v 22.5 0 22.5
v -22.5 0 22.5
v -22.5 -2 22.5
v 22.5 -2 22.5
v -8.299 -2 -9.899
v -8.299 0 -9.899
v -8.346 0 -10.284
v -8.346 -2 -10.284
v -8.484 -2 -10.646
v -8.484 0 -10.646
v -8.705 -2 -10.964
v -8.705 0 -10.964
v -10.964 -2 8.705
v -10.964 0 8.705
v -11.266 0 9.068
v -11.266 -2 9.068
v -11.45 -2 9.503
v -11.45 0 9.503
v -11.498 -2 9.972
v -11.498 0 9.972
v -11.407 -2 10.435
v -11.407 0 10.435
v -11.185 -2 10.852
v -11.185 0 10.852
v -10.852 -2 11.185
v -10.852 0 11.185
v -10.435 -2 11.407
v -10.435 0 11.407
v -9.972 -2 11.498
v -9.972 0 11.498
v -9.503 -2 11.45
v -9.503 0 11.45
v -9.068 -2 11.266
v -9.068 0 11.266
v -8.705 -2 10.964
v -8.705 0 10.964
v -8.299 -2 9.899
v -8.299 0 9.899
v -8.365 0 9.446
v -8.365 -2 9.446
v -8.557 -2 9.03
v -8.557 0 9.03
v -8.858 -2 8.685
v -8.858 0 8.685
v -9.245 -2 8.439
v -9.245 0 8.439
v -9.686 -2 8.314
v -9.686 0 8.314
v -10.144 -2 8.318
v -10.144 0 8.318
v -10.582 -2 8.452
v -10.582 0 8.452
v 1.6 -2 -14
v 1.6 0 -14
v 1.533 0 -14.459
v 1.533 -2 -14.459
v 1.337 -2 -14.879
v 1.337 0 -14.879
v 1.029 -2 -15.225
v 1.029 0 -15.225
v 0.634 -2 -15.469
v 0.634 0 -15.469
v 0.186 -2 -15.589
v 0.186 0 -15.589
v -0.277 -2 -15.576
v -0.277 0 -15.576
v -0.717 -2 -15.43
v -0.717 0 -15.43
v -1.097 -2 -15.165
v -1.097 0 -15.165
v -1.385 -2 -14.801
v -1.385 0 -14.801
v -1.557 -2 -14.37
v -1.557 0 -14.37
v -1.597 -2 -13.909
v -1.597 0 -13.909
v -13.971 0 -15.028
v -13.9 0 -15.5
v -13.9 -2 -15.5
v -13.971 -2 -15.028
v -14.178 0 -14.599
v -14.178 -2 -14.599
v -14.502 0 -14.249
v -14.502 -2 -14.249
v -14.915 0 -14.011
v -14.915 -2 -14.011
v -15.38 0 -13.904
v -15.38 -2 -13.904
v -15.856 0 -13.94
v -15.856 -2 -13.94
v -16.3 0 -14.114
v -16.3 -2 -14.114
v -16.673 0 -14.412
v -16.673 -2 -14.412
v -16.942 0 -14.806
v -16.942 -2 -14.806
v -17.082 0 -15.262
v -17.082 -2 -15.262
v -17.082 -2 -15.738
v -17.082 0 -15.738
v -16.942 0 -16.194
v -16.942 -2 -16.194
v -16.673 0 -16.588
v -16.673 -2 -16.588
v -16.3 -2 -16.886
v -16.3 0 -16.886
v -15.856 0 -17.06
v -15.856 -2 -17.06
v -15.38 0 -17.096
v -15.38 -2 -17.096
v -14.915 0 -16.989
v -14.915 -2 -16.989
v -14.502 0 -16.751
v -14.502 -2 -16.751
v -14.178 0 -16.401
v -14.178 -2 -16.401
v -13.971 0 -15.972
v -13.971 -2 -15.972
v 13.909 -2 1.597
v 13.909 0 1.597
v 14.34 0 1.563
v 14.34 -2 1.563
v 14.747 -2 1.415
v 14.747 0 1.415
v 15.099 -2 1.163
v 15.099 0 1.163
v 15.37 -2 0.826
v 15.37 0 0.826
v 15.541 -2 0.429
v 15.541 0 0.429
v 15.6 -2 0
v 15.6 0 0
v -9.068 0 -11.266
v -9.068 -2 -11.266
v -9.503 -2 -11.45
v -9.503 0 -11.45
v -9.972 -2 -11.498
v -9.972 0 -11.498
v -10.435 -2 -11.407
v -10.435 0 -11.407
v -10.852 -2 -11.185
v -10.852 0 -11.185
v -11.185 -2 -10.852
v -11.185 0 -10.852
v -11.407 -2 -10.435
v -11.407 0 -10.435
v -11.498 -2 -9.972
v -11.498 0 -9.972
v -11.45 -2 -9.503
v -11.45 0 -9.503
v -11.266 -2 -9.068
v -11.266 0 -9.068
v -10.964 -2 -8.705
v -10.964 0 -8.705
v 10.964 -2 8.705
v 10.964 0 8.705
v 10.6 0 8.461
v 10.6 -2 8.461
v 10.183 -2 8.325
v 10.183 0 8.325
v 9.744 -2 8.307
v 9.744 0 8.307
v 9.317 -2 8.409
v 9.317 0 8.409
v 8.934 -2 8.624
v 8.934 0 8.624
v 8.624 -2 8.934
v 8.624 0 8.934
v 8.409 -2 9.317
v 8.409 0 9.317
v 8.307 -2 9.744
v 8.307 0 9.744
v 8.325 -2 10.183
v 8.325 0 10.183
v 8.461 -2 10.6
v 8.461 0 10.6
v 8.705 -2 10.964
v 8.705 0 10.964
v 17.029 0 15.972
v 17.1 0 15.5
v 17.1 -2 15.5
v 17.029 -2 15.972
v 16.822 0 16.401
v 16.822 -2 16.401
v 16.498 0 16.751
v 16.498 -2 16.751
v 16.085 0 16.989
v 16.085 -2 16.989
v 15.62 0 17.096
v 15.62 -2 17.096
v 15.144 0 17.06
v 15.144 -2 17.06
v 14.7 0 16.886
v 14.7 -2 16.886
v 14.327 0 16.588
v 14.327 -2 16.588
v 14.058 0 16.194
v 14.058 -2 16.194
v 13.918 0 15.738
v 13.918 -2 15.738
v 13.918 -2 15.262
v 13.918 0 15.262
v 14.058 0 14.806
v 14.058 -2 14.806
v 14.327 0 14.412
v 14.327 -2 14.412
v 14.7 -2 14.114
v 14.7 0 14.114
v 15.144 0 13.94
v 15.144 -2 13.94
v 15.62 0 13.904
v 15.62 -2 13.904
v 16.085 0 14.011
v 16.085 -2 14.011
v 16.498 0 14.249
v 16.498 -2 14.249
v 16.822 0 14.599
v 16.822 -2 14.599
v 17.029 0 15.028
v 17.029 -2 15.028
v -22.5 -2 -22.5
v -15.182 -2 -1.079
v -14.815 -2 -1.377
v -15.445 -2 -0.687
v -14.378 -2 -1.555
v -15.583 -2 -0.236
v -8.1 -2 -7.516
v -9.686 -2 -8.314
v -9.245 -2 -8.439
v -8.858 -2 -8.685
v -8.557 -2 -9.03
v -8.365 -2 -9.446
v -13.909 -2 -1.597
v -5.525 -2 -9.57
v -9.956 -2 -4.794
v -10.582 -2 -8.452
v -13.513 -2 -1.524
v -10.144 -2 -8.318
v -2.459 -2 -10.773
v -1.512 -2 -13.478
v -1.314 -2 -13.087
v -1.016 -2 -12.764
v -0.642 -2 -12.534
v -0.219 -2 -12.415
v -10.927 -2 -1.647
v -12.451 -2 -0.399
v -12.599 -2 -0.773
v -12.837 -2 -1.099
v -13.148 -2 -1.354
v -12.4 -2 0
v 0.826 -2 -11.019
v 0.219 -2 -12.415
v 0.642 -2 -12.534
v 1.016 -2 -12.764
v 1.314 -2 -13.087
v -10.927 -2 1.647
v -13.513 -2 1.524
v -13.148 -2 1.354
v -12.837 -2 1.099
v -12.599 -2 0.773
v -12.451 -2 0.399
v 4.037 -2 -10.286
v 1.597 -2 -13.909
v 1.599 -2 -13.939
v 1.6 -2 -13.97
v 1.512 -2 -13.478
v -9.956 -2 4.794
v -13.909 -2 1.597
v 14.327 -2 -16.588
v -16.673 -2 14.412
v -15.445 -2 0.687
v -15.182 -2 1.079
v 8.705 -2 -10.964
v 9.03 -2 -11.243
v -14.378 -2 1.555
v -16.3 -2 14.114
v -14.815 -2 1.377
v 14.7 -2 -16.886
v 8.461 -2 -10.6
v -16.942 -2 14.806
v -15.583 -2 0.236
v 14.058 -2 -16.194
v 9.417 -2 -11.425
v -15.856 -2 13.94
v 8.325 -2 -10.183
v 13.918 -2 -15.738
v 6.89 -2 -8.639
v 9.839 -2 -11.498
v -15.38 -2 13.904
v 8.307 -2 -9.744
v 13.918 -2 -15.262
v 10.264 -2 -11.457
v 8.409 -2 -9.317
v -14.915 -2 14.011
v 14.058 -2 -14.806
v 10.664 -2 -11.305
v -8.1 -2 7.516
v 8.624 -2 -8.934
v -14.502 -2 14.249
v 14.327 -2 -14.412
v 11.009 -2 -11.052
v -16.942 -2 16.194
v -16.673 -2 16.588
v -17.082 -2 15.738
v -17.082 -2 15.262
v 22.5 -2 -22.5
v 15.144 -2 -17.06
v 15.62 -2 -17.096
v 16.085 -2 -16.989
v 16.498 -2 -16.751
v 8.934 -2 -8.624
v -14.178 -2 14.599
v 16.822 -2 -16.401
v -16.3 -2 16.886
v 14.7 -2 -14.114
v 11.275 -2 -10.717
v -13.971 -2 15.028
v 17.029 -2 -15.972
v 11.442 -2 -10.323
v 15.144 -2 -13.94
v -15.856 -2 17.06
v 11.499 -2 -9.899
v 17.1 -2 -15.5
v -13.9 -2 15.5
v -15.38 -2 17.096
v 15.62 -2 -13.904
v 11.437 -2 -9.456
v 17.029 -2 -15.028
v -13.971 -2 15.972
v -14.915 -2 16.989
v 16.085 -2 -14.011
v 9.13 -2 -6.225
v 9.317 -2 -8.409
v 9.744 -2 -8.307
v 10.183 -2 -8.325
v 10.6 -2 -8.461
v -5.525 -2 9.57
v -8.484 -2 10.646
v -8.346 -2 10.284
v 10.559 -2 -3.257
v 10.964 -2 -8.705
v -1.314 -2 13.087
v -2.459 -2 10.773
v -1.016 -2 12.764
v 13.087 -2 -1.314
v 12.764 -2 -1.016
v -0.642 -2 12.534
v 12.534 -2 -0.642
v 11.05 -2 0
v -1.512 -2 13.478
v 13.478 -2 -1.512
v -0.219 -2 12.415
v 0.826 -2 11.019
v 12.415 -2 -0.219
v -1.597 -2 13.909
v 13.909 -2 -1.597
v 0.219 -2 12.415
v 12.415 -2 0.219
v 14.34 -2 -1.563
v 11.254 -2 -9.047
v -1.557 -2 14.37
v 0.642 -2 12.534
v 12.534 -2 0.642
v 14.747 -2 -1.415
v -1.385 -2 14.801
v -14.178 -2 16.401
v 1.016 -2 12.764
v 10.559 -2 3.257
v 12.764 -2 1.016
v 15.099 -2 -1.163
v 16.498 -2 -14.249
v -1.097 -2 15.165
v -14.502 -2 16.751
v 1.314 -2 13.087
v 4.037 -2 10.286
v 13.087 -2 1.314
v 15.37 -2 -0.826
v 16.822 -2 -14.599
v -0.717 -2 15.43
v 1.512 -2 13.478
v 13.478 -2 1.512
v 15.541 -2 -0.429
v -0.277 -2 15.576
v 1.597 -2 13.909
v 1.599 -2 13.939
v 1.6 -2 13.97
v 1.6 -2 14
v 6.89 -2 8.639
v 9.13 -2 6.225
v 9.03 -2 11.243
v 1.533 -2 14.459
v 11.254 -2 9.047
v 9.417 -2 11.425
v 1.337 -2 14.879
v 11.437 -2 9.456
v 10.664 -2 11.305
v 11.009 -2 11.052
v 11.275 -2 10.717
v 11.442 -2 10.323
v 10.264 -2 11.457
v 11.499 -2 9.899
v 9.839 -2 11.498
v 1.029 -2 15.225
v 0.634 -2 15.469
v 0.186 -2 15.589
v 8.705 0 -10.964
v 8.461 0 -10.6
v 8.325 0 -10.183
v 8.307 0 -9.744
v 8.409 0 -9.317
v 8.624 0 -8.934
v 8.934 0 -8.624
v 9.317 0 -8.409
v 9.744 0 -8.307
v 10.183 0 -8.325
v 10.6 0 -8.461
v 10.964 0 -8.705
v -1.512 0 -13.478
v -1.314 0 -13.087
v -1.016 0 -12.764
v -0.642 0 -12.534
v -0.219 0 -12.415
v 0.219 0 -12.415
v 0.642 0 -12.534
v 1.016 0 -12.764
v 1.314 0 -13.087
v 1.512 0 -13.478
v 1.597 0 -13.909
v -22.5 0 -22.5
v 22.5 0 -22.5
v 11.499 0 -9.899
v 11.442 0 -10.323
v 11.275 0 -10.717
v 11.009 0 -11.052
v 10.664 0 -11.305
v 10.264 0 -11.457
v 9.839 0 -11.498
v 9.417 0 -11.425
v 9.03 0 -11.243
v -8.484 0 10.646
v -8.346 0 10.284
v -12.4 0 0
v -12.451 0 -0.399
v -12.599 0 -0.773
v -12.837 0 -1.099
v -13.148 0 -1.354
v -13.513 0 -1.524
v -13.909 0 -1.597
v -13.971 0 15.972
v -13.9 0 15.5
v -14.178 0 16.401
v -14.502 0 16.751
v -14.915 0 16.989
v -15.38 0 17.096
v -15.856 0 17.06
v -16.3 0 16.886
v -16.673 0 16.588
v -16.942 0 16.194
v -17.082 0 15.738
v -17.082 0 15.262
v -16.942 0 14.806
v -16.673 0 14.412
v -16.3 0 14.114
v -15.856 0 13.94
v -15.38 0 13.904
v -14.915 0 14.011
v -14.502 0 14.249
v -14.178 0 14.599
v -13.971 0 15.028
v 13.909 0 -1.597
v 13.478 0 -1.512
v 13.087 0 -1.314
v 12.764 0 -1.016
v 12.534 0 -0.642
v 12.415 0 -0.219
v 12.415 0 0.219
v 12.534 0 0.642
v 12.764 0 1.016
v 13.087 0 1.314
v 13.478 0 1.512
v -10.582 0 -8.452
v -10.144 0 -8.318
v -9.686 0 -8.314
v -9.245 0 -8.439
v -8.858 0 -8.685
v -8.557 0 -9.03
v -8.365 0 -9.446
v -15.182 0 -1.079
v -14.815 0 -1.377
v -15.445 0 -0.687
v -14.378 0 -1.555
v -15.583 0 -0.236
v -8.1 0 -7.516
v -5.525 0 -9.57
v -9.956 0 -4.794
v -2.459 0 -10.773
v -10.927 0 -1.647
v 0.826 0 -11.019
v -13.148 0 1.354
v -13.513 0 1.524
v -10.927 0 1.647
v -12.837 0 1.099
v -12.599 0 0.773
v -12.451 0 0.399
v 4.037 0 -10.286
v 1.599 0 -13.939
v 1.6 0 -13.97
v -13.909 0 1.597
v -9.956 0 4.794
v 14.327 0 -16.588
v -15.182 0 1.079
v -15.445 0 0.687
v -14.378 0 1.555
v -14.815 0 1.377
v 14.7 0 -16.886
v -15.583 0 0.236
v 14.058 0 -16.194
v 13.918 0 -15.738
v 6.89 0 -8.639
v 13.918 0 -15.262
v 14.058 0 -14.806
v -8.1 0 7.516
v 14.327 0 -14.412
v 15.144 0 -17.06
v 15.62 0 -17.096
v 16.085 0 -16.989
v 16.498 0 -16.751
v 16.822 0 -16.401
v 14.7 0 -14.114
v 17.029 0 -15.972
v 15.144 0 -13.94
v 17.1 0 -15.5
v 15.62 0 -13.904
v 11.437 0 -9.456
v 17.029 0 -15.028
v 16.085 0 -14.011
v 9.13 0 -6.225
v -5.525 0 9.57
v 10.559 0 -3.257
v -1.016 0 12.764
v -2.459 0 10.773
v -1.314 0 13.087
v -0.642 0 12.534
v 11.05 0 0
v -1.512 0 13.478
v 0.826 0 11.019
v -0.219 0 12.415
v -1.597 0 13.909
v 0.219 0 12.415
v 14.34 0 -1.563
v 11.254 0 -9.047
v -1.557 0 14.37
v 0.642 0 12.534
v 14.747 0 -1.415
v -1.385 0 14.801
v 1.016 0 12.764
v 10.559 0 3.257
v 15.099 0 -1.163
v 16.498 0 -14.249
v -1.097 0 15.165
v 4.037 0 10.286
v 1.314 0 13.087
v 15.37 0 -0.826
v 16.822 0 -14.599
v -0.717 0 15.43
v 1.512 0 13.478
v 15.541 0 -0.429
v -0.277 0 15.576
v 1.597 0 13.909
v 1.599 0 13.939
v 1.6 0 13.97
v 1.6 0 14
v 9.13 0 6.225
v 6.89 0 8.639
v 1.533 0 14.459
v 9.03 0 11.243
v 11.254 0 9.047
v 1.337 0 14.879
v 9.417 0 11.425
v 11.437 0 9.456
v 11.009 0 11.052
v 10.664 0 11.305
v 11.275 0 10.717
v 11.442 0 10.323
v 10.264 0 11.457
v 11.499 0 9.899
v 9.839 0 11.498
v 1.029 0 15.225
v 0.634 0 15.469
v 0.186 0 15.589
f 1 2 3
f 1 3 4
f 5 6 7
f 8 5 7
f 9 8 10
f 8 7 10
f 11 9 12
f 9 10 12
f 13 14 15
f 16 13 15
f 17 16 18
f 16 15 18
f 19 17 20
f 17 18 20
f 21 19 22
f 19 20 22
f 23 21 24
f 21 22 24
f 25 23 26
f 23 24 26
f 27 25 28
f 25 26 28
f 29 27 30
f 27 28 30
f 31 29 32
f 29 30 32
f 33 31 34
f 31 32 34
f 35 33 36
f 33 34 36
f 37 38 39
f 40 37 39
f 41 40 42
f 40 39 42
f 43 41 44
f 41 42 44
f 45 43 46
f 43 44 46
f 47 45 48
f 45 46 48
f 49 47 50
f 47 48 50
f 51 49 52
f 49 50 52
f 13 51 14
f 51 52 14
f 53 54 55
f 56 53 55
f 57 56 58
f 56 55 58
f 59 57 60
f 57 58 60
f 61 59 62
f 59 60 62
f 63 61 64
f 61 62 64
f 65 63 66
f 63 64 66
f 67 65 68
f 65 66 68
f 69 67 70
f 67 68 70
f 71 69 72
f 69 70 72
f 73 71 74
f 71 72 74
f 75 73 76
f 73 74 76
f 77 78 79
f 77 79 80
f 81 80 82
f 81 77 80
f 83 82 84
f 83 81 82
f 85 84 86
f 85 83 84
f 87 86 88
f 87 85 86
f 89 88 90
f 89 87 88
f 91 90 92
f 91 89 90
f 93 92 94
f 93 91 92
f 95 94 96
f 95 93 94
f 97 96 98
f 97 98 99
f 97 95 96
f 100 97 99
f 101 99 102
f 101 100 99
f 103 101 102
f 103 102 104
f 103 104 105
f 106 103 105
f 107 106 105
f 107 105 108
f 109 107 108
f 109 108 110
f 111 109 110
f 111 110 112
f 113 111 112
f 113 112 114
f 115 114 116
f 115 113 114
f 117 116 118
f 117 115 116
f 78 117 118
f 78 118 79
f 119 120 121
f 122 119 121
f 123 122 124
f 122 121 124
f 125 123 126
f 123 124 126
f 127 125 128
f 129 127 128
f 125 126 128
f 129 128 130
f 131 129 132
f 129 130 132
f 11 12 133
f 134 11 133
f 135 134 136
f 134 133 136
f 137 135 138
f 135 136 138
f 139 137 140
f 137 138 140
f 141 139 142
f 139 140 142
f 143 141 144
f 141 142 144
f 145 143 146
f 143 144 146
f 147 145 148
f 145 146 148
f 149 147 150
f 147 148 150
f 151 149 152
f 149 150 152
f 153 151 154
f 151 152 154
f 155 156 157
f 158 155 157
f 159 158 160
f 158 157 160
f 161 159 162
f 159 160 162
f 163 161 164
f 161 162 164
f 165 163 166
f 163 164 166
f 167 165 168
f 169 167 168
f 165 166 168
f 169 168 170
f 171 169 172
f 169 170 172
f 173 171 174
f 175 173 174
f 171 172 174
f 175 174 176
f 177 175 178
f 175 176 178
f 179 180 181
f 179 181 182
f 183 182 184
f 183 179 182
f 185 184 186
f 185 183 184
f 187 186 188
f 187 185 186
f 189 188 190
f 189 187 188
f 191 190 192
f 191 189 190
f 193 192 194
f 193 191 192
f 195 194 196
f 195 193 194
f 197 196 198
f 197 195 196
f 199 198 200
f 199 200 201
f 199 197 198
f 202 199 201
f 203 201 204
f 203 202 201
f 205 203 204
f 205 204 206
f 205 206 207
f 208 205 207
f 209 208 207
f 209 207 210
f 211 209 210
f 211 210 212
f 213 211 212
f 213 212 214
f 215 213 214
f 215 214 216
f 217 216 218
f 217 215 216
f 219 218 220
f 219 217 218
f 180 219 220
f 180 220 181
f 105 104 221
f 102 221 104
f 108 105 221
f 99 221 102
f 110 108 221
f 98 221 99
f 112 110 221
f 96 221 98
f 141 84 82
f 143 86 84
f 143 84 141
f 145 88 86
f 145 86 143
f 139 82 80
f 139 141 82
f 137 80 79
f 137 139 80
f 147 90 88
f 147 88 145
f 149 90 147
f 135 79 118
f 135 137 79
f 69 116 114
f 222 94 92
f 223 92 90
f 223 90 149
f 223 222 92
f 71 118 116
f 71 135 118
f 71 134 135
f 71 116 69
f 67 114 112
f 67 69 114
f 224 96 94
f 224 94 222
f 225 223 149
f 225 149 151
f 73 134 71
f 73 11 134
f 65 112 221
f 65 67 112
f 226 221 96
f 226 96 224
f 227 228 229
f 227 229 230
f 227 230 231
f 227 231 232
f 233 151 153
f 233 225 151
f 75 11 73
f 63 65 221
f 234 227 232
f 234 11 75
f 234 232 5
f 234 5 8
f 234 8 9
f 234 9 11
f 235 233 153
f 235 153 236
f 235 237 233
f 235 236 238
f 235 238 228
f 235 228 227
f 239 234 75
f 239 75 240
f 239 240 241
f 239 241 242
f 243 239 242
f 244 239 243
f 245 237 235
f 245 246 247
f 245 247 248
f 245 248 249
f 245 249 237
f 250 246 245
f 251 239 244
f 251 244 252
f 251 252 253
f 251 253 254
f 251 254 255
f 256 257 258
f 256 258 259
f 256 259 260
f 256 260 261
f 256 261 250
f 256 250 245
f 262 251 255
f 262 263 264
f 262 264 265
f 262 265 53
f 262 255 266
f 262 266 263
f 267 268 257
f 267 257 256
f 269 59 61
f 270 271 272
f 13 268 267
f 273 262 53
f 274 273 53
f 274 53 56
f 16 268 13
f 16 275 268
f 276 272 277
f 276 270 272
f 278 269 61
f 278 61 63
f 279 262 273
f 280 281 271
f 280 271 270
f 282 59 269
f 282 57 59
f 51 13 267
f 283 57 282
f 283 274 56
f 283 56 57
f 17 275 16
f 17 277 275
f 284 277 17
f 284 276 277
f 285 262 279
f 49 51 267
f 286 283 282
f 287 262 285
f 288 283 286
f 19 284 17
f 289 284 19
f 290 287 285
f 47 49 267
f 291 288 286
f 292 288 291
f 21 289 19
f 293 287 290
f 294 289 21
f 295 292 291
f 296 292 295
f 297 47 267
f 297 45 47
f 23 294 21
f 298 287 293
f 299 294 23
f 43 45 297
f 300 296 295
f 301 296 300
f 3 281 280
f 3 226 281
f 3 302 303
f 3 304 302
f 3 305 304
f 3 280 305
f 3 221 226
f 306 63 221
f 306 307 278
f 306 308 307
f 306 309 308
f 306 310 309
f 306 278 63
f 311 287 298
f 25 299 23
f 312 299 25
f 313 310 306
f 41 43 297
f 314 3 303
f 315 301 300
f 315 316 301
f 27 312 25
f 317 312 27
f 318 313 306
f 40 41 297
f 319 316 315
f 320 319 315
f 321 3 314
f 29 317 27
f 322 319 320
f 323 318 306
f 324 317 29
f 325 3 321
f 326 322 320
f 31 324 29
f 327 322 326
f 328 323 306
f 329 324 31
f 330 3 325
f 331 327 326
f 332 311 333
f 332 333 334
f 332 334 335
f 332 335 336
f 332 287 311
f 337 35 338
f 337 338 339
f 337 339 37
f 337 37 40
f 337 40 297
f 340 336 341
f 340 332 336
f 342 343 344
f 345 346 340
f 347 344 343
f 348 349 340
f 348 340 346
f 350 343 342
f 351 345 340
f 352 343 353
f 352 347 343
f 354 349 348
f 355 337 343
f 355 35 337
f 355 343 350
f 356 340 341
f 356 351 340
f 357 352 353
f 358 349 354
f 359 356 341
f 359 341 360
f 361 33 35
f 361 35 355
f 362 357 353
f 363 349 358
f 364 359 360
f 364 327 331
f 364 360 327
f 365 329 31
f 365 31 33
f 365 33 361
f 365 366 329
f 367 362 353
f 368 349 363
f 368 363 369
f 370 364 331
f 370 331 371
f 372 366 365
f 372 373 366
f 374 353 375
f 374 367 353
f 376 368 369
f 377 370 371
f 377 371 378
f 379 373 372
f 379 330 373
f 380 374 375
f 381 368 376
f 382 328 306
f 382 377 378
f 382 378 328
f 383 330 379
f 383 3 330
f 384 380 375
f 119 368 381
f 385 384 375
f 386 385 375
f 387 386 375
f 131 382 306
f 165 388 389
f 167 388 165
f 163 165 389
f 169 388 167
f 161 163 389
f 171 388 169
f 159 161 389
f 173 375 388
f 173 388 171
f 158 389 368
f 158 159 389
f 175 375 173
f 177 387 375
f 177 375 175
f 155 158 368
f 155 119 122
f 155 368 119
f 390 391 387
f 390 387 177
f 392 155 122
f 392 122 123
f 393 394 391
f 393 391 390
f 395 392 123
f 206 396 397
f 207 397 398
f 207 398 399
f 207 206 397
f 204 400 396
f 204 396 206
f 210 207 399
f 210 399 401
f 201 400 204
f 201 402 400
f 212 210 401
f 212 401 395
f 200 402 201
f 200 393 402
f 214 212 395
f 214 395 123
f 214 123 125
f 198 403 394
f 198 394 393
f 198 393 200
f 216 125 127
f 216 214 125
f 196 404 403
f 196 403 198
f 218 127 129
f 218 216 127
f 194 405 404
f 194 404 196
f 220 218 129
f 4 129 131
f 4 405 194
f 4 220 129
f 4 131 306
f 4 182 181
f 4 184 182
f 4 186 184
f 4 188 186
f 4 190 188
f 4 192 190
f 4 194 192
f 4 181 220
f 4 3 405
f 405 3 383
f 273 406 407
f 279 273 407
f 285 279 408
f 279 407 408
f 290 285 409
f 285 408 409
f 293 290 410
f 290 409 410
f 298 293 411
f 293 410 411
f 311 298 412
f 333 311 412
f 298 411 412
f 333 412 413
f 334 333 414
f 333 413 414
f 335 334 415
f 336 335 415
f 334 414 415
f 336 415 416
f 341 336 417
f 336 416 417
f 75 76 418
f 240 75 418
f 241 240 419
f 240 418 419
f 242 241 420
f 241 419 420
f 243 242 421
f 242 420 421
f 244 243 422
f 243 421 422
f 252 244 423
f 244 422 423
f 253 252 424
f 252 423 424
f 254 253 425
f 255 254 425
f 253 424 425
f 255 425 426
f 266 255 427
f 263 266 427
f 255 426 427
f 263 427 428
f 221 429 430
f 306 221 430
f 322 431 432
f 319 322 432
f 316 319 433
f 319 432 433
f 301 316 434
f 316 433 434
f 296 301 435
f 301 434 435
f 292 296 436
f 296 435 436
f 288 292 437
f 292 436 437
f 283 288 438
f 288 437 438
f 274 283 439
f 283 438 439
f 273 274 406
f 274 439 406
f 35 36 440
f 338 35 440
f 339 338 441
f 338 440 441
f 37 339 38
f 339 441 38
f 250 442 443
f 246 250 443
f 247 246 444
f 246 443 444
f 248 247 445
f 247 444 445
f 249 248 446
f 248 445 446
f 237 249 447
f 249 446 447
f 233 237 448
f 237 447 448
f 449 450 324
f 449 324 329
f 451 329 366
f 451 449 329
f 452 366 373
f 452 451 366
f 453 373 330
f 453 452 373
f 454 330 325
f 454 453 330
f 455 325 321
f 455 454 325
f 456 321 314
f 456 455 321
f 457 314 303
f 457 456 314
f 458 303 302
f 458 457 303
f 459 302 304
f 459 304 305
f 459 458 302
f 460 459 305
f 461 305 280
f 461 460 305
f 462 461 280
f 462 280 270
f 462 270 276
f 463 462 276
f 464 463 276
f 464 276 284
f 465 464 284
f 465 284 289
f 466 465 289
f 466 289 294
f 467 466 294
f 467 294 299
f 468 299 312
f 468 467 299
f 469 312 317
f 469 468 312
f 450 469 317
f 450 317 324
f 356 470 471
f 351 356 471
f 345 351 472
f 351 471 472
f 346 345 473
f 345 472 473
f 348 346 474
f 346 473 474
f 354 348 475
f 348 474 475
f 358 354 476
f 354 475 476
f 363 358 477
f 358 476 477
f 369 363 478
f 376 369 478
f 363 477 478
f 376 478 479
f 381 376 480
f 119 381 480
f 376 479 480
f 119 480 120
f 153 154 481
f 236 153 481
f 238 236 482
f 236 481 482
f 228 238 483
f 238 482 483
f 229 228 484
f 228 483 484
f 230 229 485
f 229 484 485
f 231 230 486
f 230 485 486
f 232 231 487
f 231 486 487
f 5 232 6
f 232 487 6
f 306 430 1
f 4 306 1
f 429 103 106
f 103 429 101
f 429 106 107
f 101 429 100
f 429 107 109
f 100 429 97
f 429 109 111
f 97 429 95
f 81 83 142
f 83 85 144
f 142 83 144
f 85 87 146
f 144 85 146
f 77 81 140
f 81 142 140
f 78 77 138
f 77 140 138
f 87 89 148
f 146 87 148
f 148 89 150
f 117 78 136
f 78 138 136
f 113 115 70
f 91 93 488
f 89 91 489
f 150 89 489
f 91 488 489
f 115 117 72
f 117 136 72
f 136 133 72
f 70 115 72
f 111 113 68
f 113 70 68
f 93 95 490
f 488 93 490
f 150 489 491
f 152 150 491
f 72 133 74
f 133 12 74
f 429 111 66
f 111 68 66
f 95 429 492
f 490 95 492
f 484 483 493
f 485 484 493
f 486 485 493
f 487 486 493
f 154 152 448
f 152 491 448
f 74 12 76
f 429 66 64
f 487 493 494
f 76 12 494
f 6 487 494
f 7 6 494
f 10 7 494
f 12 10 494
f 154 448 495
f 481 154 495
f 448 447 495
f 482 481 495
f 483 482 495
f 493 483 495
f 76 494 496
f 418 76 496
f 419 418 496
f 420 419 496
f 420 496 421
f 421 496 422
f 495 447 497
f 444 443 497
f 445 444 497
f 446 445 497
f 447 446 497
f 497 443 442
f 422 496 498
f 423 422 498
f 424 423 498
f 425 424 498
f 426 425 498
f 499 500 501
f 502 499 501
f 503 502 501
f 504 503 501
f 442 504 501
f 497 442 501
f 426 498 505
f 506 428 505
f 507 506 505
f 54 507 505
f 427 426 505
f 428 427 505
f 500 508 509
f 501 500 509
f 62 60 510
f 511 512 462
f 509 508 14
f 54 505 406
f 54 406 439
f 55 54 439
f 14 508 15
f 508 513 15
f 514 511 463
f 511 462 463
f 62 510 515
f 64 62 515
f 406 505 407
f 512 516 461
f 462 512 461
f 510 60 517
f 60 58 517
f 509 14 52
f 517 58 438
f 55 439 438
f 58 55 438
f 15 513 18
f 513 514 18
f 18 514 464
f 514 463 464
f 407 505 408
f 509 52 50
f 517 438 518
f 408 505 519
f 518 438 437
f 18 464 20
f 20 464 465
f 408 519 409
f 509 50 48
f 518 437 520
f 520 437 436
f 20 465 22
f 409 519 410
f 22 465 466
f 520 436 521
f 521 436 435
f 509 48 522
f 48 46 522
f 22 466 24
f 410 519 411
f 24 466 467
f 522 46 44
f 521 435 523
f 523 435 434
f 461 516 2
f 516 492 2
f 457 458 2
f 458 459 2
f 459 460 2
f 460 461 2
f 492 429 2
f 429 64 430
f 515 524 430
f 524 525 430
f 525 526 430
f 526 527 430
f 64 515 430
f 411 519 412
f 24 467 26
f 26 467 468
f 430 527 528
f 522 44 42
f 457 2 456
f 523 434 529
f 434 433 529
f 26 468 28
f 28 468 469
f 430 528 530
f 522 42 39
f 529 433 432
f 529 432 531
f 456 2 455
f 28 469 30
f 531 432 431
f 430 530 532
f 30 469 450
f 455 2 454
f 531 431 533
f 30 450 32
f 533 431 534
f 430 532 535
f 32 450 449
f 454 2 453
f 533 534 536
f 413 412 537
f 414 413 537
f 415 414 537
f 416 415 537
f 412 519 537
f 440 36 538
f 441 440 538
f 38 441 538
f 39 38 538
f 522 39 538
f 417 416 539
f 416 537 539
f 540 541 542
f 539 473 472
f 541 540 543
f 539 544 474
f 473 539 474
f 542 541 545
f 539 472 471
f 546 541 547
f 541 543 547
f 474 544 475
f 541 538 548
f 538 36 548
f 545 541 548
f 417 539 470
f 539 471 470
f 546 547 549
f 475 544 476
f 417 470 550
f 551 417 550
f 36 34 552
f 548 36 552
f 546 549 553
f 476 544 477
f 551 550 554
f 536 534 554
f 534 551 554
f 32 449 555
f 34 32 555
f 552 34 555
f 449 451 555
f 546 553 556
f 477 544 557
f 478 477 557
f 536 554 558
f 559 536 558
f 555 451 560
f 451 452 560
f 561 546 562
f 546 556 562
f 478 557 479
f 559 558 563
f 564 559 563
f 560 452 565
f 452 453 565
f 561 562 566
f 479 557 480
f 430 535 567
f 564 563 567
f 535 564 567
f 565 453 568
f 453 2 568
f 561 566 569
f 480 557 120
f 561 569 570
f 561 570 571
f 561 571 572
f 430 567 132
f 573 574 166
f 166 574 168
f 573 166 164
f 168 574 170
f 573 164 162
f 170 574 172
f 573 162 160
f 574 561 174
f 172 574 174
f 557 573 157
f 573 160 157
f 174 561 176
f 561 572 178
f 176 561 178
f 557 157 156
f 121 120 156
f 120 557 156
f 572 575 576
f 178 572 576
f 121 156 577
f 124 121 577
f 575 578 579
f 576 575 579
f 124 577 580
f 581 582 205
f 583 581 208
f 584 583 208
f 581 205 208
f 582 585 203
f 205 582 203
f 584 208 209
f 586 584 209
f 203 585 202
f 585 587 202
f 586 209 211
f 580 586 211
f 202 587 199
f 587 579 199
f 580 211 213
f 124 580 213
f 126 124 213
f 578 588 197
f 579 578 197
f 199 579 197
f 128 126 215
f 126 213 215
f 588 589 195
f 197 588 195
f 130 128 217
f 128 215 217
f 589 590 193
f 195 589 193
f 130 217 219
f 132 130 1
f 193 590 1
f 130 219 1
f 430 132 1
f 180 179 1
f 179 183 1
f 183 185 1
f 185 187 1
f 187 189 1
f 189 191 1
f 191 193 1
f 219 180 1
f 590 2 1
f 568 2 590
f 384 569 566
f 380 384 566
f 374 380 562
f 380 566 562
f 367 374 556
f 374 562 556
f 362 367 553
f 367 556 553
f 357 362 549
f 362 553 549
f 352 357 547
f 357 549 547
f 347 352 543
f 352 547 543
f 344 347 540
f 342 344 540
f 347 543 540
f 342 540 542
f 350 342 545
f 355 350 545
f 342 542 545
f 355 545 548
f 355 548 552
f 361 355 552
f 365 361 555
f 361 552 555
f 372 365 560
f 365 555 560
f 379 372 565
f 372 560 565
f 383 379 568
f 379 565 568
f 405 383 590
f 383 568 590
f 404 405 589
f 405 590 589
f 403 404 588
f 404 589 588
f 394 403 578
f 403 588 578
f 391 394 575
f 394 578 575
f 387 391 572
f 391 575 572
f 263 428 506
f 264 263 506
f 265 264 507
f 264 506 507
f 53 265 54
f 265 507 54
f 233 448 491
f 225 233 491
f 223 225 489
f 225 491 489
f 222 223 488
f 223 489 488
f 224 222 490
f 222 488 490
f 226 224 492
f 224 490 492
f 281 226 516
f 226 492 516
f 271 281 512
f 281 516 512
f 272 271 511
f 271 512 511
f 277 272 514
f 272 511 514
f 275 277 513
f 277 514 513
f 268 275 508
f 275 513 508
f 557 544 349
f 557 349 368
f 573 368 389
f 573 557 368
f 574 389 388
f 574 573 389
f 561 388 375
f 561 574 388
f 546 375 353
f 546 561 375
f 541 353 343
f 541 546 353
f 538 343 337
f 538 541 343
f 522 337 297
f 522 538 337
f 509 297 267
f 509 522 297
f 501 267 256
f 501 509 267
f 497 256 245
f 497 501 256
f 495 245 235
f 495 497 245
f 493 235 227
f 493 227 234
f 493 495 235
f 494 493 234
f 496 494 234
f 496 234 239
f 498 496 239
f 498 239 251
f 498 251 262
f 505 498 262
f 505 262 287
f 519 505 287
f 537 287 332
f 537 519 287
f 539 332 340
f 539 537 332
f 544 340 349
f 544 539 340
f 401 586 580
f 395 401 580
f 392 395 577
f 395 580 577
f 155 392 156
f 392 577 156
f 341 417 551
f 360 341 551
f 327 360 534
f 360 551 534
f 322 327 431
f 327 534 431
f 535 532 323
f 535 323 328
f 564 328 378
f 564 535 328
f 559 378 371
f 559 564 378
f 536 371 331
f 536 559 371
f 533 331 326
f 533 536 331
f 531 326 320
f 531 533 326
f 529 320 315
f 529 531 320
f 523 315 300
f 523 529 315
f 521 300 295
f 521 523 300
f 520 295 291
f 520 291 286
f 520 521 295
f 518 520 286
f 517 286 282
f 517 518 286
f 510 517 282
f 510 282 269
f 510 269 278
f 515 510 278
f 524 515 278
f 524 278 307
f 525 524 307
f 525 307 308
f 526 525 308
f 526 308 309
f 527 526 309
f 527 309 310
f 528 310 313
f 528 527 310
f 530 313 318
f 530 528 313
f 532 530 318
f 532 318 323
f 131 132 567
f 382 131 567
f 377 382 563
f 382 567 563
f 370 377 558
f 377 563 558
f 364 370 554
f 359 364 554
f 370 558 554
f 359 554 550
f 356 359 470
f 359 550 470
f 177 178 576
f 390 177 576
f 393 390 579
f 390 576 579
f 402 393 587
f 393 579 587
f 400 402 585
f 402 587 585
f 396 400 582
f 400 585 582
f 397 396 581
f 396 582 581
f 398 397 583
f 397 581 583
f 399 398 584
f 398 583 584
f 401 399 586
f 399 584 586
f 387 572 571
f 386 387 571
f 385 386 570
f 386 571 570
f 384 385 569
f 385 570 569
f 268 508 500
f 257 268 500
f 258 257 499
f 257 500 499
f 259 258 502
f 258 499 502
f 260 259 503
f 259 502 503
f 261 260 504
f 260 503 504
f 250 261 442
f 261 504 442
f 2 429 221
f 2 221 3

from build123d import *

# Parameters (mm, degrees)
F0_W     = 45
F0_H     = 45
F0_R     = 1.6
F0_R_2   = 11.05
F1_DEPTH = 2


with BuildPart() as f1:
    # F0 (on Front) → F1 (new body)
    with BuildSketch(Plane.XZ):
        Rectangle(F0_W, F0_H)
        with Locations((-15.5, -15.5)):
            Circle(F0_R, mode=Mode.SUBTRACT)
        with Locations((15.5, -15.5)):
            Circle(F0_R, mode=Mode.SUBTRACT)
        with Locations((-15.5, 15.5)):
            Circle(F0_R, mode=Mode.SUBTRACT)
        with BuildLine():
            ThreePointArc((10.964367, 8.705323), (12.934313, 5.357568), (13.908571, 1.597386))
            ThreePointArc((13.908571, 1.597386), (15.09857, 1.163247), (15.6, 0))
            ThreePointArc((15.6, 0), (15.09857, -1.163247), (13.908571, -1.597386))
            ThreePointArc((13.908571, -1.597386), (12.934313, -5.357568), (10.964367, -8.705323))
            ThreePointArc((10.964367, -8.705323), (11.359597, -9.2452), (11.499495, -9.899495))
            ThreePointArc((11.499495, -9.899495), (10.469287, -11.394599), (8.705323, -10.964367))
            ThreePointArc((8.705323, -10.964367), (5.357568, -12.934313), (1.597386, -13.908571))
            ThreePointArc((1.597386, -13.908571), (1.599346, -13.954267), (1.6, -14))
            ThreePointArc((1.6, -14), (-0.045733, -15.599346), (-1.597386, -13.908571))
            ThreePointArc((-1.597386, -13.908571), (-5.357568, -12.934313), (-8.705323, -10.964367))
            ThreePointArc((-8.705323, -10.964367), (-11.030866, -11.030866), (-10.964367, -8.705323))
            ThreePointArc((-10.964367, -8.705323), (-12.934313, -5.357568), (-13.908571, -1.597386))
            ThreePointArc((-13.908571, -1.597386), (-15.6, 0), (-13.908571, 1.597386))
            ThreePointArc((-13.908571, 1.597386), (-12.934313, 5.357568), (-10.964367, 8.705323))
            ThreePointArc((-10.964367, 8.705323), (-11.030866, 11.030866), (-8.705323, 10.964367))
            ThreePointArc((-8.705323, 10.964367), (-5.357568, 12.934313), (-1.597386, 13.908571))
            ThreePointArc((-1.597386, 13.908571), (-0.045733, 15.599346), (1.6, 14))
            ThreePointArc((1.6, 14), (1.599346, 13.954267), (1.597386, 13.908571))
            ThreePointArc((1.597386, 13.908571), (5.357568, 12.934313), (8.705323, 10.964367))
            ThreePointArc((8.705323, 10.964367), (10.469287, 11.394599), (11.499495, 9.899495))
            ThreePointArc((11.499495, 9.899495), (11.359597, 9.2452), (10.964367, 8.705323))
        make_face(mode=Mode.SUBTRACT)
        with Locations((15.5, 15.5)):
            Circle(F0_R, mode=Mode.SUBTRACT)
        with BuildLine():
            ThreePointArc((13.908571, -1.597386), (12.4, 0), (13.908571, 1.597386))
            ThreePointArc((13.908571, 1.597386), (12.934313, 5.357568), (10.964367, 8.705323))
            ThreePointArc((10.964367, 8.705323), (8.768124, 8.768124), (8.705323, 10.964367))
            ThreePointArc((8.705323, 10.964367), (5.357568, 12.934313), (1.597386, 13.908571))
            ThreePointArc((1.597386, 13.908571), (0, 12.4), (-1.597386, 13.908571))
            ThreePointArc((-1.597386, 13.908571), (-5.357568, 12.934313), (-8.705323, 10.964367))
            ThreePointArc((-8.705323, 10.964367), (-8.40439, 10.469287), (-8.299495, 9.899495))
            ThreePointArc((-8.299495, 9.899495), (-9.2452, 8.439393), (-10.964367, 8.705323))
            ThreePointArc((-10.964367, 8.705323), (-12.934313, 5.357568), (-13.908571, 1.597386))
            ThreePointArc((-13.908571, 1.597386), (-12.836753, 1.09857), (-12.4, 0))
            ThreePointArc((-12.4, 0), (-12.836753, -1.09857), (-13.908571, -1.597386))
            ThreePointArc((-13.908571, -1.597386), (-12.934313, -5.357568), (-10.964367, -8.705323))
            ThreePointArc((-10.964367, -8.705323), (-9.2452, -8.439393), (-8.299495, -9.899495))
            ThreePointArc((-8.299495, -9.899495), (-8.40439, -10.469287), (-8.705323, -10.964367))
            ThreePointArc((-8.705323, -10.964367), (-5.357568, -12.934313), (-1.597386, -13.908571))
            ThreePointArc((-1.597386, -13.908571), (0, -12.4), (1.597386, -13.908571))
            ThreePointArc((1.597386, -13.908571), (5.357568, -12.934313), (8.705323, -10.964367))
            ThreePointArc((8.705323, -10.964367), (8.768124, -8.768124), (10.964367, -8.705323))
            ThreePointArc((10.964367, -8.705323), (12.934313, -5.357568), (13.908571, -1.597386))
        make_face()
        Circle(F0_R_2, mode=Mode.SUBTRACT)
    extrude(amount=F1_DEPTH)


solid = f1.part
